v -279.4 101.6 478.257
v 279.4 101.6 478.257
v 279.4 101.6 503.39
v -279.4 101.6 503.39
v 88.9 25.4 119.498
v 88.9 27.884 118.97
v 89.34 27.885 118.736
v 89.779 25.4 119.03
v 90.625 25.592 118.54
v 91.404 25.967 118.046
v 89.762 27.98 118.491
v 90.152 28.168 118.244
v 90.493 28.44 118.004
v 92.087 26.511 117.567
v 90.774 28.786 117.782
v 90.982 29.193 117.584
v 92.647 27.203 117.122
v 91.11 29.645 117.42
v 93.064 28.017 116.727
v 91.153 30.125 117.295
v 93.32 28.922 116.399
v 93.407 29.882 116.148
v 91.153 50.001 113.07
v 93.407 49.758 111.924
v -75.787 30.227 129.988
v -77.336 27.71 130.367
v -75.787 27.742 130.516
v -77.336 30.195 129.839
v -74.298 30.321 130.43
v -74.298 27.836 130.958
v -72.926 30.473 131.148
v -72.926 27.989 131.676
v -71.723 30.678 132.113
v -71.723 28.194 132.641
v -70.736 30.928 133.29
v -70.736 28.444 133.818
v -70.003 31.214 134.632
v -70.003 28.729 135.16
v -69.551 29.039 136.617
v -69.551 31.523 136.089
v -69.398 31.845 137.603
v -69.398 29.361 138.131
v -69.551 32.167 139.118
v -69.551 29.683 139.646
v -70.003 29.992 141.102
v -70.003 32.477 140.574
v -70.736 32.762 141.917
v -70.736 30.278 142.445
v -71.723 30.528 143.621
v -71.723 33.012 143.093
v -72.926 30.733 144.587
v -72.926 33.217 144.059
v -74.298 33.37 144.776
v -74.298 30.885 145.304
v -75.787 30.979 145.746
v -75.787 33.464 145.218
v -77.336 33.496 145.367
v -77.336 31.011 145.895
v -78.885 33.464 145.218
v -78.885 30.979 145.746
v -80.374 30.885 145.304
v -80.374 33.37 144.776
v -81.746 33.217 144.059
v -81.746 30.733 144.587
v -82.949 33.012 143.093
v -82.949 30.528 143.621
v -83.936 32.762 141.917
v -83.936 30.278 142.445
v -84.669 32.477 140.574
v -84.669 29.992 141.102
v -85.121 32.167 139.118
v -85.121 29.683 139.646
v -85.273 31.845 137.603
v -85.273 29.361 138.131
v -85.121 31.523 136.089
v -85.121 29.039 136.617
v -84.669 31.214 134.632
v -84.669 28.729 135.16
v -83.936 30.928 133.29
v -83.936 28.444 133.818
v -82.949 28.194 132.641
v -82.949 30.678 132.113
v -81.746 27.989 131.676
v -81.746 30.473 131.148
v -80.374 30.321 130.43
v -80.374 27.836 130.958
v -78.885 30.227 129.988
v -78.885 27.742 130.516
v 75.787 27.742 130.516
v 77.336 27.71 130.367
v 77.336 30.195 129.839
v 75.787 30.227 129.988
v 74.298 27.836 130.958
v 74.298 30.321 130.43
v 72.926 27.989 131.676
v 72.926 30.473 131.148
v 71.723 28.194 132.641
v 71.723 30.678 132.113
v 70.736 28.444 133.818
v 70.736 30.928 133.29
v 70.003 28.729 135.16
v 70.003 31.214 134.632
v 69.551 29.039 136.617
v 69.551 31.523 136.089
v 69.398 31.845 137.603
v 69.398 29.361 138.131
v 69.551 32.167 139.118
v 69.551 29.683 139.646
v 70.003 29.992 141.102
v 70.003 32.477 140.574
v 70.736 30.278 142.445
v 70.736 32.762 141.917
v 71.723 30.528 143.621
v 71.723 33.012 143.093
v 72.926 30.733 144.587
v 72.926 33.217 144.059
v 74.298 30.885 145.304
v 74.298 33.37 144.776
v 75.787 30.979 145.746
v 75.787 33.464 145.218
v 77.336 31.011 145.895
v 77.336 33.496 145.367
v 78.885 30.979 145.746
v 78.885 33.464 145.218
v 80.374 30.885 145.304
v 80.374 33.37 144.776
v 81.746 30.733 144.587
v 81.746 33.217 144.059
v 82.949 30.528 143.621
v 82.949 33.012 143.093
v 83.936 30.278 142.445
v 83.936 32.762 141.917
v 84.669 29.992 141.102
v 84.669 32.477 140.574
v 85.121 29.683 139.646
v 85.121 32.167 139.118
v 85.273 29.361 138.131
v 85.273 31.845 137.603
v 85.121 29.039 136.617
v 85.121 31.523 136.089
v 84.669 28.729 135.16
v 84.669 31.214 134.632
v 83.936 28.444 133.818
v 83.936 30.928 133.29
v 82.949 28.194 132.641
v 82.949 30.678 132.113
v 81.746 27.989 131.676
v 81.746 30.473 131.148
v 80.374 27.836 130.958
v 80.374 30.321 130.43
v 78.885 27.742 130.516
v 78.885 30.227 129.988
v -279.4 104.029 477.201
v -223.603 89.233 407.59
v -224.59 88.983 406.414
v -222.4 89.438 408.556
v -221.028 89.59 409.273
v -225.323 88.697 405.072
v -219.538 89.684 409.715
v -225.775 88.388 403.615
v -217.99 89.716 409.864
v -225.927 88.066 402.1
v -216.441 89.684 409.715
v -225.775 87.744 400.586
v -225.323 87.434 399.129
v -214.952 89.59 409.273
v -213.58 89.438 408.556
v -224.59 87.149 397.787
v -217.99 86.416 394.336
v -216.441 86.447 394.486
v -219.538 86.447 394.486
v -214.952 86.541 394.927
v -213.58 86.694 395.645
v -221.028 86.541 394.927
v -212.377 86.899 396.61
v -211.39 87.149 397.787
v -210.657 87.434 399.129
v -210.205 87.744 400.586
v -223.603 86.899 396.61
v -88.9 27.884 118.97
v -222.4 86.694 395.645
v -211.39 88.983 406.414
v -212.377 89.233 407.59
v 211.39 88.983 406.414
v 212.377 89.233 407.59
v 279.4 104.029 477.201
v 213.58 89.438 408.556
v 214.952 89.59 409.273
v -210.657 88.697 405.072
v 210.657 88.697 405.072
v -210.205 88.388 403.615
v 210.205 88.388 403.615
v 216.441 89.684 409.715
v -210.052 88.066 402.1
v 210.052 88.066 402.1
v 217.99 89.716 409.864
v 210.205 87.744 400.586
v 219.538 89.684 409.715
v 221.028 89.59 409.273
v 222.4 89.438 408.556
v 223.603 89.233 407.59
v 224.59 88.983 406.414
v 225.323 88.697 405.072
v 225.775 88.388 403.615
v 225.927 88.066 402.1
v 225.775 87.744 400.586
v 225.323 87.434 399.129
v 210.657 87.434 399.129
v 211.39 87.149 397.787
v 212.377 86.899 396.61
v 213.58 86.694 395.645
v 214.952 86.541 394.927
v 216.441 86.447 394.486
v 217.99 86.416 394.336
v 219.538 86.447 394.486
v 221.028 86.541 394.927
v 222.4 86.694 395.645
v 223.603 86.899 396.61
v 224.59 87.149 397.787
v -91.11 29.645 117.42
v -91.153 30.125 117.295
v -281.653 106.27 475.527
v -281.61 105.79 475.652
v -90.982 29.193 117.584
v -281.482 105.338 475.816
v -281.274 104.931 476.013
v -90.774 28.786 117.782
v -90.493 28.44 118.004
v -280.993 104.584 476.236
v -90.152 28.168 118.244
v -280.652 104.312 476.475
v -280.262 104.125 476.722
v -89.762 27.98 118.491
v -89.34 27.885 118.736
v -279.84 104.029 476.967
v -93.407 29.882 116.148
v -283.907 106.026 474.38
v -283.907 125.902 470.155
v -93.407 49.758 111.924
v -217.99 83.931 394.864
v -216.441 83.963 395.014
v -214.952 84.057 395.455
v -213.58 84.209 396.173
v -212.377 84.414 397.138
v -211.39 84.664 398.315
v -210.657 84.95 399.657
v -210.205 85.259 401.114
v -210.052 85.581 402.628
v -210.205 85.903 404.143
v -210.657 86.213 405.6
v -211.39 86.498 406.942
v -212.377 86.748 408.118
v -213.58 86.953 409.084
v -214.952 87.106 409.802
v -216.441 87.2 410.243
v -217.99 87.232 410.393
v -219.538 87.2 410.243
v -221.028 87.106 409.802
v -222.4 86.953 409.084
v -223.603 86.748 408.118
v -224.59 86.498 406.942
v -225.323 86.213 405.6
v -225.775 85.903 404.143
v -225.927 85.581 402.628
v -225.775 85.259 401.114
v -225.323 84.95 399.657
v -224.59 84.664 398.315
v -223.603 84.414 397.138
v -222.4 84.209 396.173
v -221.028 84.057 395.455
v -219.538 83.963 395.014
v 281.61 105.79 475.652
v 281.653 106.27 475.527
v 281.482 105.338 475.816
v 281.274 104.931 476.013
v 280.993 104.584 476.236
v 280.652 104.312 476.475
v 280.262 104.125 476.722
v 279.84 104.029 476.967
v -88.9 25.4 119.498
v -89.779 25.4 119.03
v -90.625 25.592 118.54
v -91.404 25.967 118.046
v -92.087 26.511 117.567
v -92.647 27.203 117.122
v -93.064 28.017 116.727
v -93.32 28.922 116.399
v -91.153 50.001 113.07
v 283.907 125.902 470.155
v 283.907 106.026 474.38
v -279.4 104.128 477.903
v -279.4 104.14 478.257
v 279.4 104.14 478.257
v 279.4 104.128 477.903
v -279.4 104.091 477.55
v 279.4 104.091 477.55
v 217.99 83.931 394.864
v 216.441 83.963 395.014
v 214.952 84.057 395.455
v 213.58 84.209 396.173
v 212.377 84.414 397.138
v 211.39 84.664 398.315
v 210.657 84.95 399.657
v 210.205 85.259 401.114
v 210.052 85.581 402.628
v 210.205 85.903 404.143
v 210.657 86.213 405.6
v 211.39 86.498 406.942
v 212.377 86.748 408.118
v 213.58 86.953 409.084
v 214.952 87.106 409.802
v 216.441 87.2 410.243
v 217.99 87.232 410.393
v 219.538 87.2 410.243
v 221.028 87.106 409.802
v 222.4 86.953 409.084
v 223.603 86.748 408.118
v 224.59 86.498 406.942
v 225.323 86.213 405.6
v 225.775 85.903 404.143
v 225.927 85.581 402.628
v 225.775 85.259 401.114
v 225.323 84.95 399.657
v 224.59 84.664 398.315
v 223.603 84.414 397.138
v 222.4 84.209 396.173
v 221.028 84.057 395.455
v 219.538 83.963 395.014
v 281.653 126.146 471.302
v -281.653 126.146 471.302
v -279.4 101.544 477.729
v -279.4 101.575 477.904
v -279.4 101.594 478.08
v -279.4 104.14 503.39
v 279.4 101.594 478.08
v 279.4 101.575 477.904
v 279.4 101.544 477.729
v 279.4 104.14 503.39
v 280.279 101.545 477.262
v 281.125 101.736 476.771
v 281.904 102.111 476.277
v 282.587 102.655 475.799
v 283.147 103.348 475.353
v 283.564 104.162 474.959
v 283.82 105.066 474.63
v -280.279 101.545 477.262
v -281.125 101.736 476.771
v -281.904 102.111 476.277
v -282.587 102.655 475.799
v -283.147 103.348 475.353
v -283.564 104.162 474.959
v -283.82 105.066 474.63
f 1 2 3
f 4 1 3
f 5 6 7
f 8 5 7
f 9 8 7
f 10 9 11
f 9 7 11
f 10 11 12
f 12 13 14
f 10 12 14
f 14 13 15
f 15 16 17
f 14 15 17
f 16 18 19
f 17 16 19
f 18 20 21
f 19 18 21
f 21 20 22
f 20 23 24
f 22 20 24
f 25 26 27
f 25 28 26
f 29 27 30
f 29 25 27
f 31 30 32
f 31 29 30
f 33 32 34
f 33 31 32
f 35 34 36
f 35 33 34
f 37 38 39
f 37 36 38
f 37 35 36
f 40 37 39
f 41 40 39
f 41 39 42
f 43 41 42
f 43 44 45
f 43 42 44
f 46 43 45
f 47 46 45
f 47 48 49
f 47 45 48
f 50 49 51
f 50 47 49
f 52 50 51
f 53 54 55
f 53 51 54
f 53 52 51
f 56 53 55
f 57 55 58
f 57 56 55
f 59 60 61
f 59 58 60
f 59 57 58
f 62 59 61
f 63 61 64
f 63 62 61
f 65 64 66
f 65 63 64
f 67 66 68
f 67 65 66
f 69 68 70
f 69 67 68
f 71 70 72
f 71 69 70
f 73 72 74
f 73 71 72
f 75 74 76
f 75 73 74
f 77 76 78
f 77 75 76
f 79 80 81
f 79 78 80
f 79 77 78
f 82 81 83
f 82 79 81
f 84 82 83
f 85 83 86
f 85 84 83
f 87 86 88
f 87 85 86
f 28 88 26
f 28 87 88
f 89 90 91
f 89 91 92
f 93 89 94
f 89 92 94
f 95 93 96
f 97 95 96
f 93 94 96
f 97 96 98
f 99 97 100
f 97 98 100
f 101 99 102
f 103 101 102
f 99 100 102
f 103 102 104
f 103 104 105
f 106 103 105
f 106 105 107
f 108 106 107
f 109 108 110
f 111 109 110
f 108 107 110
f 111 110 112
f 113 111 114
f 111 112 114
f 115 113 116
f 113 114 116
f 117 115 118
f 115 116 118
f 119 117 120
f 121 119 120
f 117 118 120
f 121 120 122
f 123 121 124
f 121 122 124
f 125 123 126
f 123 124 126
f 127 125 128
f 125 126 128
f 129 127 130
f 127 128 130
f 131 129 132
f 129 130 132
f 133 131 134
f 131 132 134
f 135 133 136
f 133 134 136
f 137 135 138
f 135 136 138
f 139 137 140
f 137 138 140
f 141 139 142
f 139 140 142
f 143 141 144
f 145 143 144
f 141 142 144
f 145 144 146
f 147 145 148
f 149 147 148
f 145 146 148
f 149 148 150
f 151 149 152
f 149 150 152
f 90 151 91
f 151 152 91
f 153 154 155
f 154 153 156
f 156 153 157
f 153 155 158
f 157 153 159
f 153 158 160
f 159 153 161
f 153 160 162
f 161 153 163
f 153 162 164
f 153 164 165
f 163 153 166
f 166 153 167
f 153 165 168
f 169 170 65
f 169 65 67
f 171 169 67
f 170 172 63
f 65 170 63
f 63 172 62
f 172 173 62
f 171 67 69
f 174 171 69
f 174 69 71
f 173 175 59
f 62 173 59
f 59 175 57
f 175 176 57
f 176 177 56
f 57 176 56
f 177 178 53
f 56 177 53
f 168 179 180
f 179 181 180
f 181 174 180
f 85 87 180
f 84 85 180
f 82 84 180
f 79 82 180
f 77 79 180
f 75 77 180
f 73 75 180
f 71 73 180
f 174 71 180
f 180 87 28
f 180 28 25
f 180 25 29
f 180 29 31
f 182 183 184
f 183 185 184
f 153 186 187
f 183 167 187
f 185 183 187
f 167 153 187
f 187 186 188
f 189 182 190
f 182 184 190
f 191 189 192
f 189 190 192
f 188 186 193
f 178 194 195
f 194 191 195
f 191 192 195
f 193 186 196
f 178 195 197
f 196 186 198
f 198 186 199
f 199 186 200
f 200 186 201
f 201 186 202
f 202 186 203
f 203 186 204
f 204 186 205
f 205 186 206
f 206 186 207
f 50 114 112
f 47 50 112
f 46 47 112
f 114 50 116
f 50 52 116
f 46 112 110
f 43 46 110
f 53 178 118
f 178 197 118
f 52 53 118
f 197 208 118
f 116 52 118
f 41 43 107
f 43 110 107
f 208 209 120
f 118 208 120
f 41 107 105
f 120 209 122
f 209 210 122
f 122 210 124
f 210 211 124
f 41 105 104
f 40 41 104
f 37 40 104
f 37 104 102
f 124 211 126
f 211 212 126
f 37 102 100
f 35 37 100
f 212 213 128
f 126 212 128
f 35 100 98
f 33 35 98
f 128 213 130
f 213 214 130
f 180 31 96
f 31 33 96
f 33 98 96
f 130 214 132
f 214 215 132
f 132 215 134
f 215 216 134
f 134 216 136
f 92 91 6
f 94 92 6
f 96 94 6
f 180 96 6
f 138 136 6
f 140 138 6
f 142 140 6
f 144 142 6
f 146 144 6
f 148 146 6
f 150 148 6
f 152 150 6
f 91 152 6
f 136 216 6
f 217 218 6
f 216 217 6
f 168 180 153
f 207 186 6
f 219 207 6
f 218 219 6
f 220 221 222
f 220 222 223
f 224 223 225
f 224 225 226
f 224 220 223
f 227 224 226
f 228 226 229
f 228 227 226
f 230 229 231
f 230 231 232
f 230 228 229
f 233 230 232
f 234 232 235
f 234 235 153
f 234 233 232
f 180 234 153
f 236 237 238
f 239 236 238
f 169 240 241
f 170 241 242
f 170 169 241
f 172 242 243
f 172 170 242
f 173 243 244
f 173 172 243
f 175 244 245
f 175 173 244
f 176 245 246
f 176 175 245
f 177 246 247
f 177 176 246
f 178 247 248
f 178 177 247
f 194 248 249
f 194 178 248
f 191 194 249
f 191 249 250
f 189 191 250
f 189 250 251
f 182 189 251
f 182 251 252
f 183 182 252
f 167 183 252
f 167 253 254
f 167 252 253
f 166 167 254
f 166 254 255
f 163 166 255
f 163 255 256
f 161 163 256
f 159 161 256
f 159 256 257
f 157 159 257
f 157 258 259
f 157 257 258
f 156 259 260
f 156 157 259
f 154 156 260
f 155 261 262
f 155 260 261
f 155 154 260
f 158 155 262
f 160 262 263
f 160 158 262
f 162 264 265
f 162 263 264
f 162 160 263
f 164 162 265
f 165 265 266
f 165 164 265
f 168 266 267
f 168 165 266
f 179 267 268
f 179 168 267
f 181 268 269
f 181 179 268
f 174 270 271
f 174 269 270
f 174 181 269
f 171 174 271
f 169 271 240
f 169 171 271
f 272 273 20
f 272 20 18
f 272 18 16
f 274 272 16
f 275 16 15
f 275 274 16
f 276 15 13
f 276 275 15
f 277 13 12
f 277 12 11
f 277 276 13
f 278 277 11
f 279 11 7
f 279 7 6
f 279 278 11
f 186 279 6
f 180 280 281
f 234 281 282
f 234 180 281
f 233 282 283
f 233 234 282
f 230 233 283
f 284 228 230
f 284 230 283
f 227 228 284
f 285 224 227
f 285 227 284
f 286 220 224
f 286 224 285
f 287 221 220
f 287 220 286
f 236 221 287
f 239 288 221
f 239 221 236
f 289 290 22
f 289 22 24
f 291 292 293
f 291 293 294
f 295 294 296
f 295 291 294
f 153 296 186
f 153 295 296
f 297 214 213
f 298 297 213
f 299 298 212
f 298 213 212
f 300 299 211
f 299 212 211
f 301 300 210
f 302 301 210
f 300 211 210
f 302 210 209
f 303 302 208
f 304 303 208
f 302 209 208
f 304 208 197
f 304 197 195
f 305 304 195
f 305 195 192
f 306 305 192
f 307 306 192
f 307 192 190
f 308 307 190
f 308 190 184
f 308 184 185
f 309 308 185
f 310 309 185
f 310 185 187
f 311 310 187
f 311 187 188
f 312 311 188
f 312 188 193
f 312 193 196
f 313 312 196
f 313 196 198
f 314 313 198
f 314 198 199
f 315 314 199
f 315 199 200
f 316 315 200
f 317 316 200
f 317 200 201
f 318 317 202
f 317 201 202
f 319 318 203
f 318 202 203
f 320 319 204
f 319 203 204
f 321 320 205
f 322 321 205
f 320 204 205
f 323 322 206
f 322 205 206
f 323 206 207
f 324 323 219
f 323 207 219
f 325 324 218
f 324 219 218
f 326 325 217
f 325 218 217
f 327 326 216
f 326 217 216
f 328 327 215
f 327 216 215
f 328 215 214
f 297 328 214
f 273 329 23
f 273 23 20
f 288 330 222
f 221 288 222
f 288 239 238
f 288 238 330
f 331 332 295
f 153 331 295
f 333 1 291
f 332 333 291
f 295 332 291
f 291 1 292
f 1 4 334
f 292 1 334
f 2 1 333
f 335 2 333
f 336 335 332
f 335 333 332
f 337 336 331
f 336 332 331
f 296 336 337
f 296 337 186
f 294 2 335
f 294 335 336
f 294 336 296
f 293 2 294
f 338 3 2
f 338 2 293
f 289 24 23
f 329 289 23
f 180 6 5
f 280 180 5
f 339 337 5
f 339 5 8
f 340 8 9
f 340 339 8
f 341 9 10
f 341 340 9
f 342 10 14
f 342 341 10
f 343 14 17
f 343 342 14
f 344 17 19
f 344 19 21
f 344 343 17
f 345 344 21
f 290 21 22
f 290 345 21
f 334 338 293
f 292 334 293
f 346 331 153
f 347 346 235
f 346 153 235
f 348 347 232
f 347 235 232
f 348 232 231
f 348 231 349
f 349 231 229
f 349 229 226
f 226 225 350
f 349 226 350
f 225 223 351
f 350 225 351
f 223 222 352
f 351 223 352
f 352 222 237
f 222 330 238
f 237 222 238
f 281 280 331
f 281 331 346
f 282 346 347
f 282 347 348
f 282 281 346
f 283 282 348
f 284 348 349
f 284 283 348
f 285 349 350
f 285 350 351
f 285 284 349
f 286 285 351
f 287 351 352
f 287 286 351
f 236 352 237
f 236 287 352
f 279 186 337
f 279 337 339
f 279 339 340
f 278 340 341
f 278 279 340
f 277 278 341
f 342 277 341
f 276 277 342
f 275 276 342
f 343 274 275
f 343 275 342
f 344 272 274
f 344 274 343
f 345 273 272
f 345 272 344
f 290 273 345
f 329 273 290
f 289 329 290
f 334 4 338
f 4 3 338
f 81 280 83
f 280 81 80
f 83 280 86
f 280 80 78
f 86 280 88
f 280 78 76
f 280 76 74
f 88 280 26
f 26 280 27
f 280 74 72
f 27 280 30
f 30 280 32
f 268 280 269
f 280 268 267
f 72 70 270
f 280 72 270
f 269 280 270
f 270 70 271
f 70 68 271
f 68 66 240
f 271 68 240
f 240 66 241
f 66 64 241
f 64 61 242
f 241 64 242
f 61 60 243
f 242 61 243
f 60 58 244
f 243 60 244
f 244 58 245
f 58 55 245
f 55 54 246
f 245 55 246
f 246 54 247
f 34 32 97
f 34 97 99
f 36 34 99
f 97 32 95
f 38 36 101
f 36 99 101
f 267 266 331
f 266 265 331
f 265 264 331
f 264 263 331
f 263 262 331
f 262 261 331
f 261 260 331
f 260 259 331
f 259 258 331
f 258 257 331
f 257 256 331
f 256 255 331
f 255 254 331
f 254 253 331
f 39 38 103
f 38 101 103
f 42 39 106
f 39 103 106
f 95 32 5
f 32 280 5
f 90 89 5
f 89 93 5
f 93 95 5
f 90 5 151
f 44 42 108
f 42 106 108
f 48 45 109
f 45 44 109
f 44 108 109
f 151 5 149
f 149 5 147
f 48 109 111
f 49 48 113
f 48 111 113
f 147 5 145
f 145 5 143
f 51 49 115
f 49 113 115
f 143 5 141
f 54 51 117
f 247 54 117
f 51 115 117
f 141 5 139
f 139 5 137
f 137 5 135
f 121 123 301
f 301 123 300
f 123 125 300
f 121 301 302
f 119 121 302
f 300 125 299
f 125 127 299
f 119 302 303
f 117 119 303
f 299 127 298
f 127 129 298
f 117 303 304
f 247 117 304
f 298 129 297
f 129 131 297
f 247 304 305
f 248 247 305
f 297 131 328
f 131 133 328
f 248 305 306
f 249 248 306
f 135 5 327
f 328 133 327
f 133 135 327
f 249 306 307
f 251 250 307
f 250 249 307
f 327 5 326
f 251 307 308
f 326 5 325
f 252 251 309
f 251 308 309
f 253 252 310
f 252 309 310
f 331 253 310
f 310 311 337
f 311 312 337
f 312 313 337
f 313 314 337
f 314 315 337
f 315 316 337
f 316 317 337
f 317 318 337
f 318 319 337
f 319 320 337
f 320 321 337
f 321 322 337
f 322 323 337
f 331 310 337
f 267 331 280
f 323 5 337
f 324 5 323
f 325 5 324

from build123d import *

# Parameters (mm, degrees)
BOSS_EXTRUDE1_DEPTH     = 279.4
CONVERT_SOLID1_START    = -279.4
CONVERT_SOLID1_DEPTH    = 558.8
CONVERT_SOLID1_2_DEPTH  = 558.8
CUT_EXTRUDE1_DEPTH      = 586.091506768
EDGE_FLANGE1_DEPTH      = 412.817360463
EDGE_FLANGE1_BEND_DEPTH = 412.817360463
SKETCH12_R              = 7.9375
CUT_EXTRUDE2_DEPTH      = 592.463463584


# Read off the part's stored shape, not the designer's step: Convert-Solid1
# Sheet-metal steps are written as plain solids
with BuildPart() as part:
    # Sketch3 → Boss-Extrude1 (new, symmetric)
    with BuildSketch(Plane(origin=(0, 0, 0), x_dir=(0, 0, -1), z_dir=(1, 0, 0))):
        Polygon((-477.990419123, 101.6), (-503.390419123, 101.6), (-503.390419123, 104.14), (-477.723454365, 104.14), (-118.969509086, 27.884494906), (-119.497604781, 25.4), align=None)
    extrude(amount=BOSS_EXTRUDE1_DEPTH, both=True)

    # Convert-Solid1 outline → Convert-Solid1 (cut)
    with BuildSketch(Plane.YZ.offset(CONVERT_SOLID1_START)):
        with BuildLine():
            Line((104.14, 477.723454365), (104.14, 478.257383881))
            ThreePointArc((104.14, 478.257383881), (104.112171228, 477.726379287), (104.028989812, 477.201192491))
            Line((104.028989812, 477.201192491), (104.14, 477.723454365))
        make_face()
    extrude(amount=CONVERT_SOLID1_DEPTH, mode=Mode.SUBTRACT)

    # Convert-Solid1 2 outline → Convert-Solid1 2 (add)
    with BuildSketch(Plane.YZ.offset(CONVERT_SOLID1_START)):
        with BuildLine():
            Line((101.6, 477.990419123), (101.6, 478.257383881))
            ThreePointArc((101.6, 478.257383881), (101.586085614, 477.991881584), (101.544494906, 477.729288186))
            Line((101.544494906, 477.729288186), (101.6, 477.990419123))
        make_face()
    extrude(amount=CONVERT_SOLID1_2_DEPTH)

    # Sketch8 → Cut-Extrude1 (cut, through all)
    with BuildSketch(Plane(origin=(0, 2.484494906, -0.528095695), x_dir=(1, 0, 0), z_dir=(0, 0.978147600733807, -0.20791169081775257))):
        Polygon((279.4, -488.402044668), (88.9, -122.167252357), (279.4, -122.167252357), align=None)
        Polygon((-88.9, -122.167252357), (-279.4, -488.402044668), (-279.4, -122.167252357), align=None)
    extrude(amount=-CUT_EXTRUDE1_DEPTH, mode=Mode.SUBTRACT)

    # Edge-Flange1 section (across the edge) → Edge-Flange1 (add)
    with BuildSketch(Plane(origin=(281.653384818, 103.785293108, 476.054689643), x_dir=(-0.8871593769725215, 0.09594358400128161, 0.4513790741037036), z_dir=(-0.46146315112880654, -0.18445080609118086, -0.8677728160541711))):
        with BuildLine():
            Line((-2.54, 2.54), (-2.54, 22.86))
            Line((-2.54, 22.86), (0, 22.86))
            Line((0, 22.86), (0, 2.54))
            ThreePointArc((0, 2.54), (0.743948776, 0.743948776), (2.54, 0))
            Line((2.54, 0), (2.54, -2.54))
            ThreePointArc((2.54, -2.54), (-1.052102448, -1.052102448), (-2.54, 2.54))
        make_face()
    extrude(amount=EDGE_FLANGE1_DEPTH)

    # Edge-Flange1 section 2 (across the edge) → Edge-Flange1 bend (add)
    with BuildSketch(Plane(origin=(-91.153384818, 27.640798203, 117.823006238), x_dir=(0.8871593769725281, 0.09594358400127896, 0.4513790741036911), z_dir=(-0.46146315112879377, 0.18445080609118228, 0.8677728160541774))):
        with BuildLine():
            Line((-2.54, 2.54), (-2.54, 22.86))
            Line((-2.54, 22.86), (0, 22.86))
            Line((0, 22.86), (0, 2.54))
            ThreePointArc((0, 2.54), (0.743948776, 0.743948776), (2.54, 0))
            Line((2.54, 0), (2.54, -2.54))
            ThreePointArc((2.54, -2.54), (-1.052102448, -1.052102448), (-2.54, 2.54))
        make_face()
    extrude(amount=EDGE_FLANGE1_BEND_DEPTH)

    # Sketch12 → Cut-Extrude2 (cut, symmetric)
    with BuildSketch(Plane(origin=(0, 2.484494906, -0.528095695), x_dir=(1, 0, 0), z_dir=(0, 0.9781476007338071, -0.2079116908177526))):
        with Locations(Location((217.989950501, -411.623430458, 0), (0, 0, 90))):
            Circle(SKETCH12_R)
        with Locations(Location((77.335982037, -141.217252357, 0), (0, 0, 90))):
            Circle(SKETCH12_R)
    cut_extrude2 = extrude(amount=CUT_EXTRUDE2_DEPTH, both=True, mode=Mode.SUBTRACT)

    # Mirror8: Cut-Extrude2 across plane
    add(cut_extrude2.mirror(Plane(origin=(0, 0, 0), x_dir=(0, 0, 1), z_dir=(1, 0, 0))), mode=Mode.SUBTRACT)


solid = part.part
